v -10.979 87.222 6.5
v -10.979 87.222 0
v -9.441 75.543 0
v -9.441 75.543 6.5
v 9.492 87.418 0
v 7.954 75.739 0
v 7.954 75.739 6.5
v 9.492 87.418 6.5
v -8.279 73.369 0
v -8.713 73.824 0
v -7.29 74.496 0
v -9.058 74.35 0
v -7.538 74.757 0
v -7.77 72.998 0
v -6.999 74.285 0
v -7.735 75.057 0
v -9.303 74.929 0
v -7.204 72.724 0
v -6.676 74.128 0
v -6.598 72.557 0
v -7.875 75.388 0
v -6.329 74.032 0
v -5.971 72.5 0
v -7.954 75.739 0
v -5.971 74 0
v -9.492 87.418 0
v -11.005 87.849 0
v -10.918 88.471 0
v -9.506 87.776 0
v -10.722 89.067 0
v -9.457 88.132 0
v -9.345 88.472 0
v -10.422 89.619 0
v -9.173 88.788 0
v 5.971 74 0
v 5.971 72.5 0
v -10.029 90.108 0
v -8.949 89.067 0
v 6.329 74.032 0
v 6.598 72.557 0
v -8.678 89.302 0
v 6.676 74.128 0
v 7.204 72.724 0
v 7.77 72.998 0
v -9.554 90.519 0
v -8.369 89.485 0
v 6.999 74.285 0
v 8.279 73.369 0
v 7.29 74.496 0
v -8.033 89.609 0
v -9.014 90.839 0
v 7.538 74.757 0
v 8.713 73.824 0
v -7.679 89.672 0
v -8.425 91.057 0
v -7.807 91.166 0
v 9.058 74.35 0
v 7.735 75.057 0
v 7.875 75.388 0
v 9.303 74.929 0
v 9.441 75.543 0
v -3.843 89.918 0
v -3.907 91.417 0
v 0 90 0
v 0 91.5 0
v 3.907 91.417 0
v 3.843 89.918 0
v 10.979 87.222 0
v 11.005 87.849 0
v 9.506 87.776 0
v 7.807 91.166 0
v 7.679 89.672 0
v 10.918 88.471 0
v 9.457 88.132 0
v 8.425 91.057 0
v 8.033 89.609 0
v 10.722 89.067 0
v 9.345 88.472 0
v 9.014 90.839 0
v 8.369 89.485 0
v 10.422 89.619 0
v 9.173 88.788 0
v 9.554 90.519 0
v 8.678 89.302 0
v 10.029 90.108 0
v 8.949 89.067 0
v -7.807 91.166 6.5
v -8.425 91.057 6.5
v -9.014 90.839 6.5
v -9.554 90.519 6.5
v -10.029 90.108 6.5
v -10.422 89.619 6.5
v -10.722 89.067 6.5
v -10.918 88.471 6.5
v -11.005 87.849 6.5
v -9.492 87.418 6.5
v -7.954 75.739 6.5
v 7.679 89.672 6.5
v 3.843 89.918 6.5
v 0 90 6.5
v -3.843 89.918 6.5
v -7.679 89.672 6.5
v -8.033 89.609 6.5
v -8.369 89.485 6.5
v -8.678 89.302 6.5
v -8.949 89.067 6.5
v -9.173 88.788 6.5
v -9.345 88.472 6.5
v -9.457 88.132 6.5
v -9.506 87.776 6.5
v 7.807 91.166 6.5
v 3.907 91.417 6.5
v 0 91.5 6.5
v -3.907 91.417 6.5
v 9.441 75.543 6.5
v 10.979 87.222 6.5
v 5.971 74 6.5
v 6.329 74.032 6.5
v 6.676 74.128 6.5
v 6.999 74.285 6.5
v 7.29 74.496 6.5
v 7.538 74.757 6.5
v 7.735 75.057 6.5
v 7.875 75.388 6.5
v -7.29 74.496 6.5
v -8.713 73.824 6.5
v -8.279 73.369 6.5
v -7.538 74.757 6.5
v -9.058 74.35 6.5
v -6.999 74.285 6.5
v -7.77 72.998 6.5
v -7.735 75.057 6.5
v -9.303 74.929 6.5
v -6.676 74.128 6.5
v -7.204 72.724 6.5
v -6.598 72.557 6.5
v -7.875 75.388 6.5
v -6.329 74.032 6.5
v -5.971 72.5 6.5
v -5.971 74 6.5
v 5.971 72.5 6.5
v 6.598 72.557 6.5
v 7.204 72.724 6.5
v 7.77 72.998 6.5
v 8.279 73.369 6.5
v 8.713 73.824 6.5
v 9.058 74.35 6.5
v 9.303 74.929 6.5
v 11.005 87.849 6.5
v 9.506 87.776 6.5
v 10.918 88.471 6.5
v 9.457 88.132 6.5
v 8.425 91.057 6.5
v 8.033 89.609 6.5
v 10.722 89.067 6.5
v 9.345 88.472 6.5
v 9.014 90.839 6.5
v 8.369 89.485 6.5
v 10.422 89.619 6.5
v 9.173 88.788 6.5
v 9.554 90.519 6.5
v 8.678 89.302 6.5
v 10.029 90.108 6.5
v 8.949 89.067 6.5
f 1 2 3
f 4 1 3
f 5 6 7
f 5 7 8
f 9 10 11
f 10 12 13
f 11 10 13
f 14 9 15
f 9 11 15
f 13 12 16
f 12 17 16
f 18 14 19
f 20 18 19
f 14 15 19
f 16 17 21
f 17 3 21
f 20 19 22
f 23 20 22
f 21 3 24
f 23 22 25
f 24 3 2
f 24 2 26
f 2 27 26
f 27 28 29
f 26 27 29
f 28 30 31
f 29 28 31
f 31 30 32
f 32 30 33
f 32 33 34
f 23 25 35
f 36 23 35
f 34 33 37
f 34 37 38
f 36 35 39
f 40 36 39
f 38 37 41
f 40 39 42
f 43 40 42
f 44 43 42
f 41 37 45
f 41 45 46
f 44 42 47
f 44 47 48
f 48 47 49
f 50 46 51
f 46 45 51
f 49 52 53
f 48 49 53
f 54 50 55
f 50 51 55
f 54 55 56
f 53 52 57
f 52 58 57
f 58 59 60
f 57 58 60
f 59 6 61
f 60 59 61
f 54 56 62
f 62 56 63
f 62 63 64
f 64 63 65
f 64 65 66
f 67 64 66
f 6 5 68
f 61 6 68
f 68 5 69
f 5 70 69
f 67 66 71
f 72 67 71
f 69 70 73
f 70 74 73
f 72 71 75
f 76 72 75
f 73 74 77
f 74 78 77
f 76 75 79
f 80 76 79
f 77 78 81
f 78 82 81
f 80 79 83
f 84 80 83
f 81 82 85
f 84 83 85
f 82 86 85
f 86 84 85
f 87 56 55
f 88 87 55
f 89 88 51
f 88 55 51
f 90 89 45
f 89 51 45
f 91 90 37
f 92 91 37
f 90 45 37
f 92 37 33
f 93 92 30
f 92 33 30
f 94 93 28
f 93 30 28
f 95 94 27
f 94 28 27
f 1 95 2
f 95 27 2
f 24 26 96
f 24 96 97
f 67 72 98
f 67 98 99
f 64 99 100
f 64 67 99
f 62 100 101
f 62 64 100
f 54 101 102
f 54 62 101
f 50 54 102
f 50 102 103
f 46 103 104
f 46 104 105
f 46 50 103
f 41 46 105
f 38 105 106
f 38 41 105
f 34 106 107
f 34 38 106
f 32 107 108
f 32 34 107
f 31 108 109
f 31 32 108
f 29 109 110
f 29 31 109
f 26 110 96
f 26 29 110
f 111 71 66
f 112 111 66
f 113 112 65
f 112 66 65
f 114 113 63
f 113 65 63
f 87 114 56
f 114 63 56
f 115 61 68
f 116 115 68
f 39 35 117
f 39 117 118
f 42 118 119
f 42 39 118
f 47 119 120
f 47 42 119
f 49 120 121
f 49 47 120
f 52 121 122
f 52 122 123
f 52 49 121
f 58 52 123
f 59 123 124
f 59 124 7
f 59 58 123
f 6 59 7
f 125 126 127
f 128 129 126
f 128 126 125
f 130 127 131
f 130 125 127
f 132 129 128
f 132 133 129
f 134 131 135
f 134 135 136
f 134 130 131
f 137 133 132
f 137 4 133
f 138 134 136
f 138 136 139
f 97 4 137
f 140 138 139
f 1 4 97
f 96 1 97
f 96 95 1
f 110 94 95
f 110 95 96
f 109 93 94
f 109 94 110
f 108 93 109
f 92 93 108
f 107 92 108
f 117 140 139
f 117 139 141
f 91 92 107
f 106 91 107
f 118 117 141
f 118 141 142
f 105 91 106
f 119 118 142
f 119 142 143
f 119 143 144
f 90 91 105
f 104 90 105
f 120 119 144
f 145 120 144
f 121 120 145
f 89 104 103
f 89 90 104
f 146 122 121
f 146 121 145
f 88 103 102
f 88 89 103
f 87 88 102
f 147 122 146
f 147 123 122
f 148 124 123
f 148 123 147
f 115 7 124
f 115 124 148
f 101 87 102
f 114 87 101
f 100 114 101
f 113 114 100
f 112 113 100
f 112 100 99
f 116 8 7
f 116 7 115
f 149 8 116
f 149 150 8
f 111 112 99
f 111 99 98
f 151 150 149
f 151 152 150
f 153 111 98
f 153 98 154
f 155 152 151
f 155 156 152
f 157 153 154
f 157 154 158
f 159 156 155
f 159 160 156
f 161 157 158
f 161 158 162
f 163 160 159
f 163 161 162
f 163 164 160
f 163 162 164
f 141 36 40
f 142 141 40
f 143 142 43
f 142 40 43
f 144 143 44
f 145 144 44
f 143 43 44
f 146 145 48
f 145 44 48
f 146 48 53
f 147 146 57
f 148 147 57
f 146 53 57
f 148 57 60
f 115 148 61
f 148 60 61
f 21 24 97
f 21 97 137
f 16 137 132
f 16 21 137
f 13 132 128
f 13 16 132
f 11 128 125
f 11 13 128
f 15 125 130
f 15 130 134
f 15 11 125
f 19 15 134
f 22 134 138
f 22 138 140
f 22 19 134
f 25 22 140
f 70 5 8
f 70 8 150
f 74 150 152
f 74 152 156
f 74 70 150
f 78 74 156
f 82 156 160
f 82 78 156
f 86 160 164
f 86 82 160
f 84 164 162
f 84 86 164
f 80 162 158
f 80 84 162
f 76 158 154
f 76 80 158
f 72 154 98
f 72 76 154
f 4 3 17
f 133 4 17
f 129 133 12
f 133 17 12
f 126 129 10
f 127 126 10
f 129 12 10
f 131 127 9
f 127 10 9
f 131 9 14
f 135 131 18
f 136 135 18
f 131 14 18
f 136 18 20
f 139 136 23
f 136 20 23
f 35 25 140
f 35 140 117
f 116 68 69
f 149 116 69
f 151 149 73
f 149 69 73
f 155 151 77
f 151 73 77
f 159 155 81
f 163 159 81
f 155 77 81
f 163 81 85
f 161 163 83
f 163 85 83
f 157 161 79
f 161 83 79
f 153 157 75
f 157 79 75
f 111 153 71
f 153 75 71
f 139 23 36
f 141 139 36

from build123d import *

# Parameters (mm, degrees)
BOSS_EXTRUDE1_DEPTH = 6.5


with BuildPart() as part:
    # Sketch1 → Boss-Extrude1 (new body)
    with BuildSketch(Plane.XY):
        with BuildLine():
            Line((9.441130989, 75.543158327), (10.978710332, 87.222232942))
            ThreePointArc((10.978710332, 87.222232942), (10.23623569, 89.872312951), (7.807292937, 91.166310537))
            ThreePointArc((7.807292937, 91.166310537), (0, 91.5), (-7.807292937, 91.166310537))
            ThreePointArc((-7.807292937, 91.166310537), (-10.23623569, 89.872312951), (-10.978710332, 87.222232942))
            Line((-10.978710332, 87.222232942), (-9.441130989, 75.543158327))
            ThreePointArc((-9.441130989, 75.543158327), (-8.278784327, 73.368560674), (-5.971073974, 72.5))
            Line((-5.971073974, 72.5), (5.971073974, 72.5))
            ThreePointArc((5.971073974, 72.5), (8.278784327, 73.368560674), (9.441130989, 75.543158327))
        make_face()
        with BuildLine():
            Line((-9.49154304, 87.418022231), (-7.953963697, 75.738947616))
            ThreePointArc((-7.953963697, 75.738947616), (-7.289765605, 74.496320385), (-5.971073974, 74))
            Line((-5.971073974, 74), (5.971073974, 74))
            ThreePointArc((5.971073974, 74), (7.289765605, 74.496320385), (7.953963697, 75.738947616))
            Line((7.953963697, 75.738947616), (9.49154304, 87.418022231))
            ThreePointArc((9.49154304, 87.418022231), (9.067271816, 88.932353664), (7.679304529, 89.671780856))
            ThreePointArc((7.679304529, 89.671780856), (0, 90), (-7.679304529, 89.671780856))
            ThreePointArc((-7.679304529, 89.671780856), (-9.067271816, 88.932353664), (-9.49154304, 87.418022231))
        make_face(mode=Mode.SUBTRACT)
    extrude(amount=BOSS_EXTRUDE1_DEPTH)


solid = part.part
